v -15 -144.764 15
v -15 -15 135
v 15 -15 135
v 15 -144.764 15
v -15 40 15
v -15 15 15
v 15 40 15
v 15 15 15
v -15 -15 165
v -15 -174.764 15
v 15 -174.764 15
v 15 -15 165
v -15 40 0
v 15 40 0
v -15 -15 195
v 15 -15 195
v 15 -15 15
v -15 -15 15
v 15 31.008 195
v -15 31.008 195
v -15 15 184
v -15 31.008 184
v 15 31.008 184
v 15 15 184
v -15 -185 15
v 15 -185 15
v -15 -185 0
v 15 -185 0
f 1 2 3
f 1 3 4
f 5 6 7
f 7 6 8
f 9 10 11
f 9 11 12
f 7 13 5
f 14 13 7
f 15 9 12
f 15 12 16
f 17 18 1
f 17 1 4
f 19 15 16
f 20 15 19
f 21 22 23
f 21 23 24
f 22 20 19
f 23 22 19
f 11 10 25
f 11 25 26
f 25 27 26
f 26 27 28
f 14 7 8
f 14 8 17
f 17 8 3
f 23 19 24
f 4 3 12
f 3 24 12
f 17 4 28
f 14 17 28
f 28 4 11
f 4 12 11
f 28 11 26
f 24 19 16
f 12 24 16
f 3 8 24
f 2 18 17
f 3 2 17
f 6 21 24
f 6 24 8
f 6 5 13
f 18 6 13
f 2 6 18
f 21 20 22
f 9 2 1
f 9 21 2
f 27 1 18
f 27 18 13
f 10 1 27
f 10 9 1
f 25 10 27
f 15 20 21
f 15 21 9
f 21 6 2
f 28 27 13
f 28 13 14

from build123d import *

# Parameters (mm, degrees)
F0_W      = 30
F0_H      = 50
F1_DEPTH  = 15
F2_W      = 30
F2_H      = 30
F3_DEPTH  = 150
F4_DEPTH  = 160
F6_DEPTH  = 30
F7_W      = 16.00820072
F7_H      = 6
F8_DEPTH  = 30
F9_DEPTH  = 15
F10_DEPTH = 5


with BuildPart() as f1:
    # F0 (on Top) → F1 (new body)
    with BuildSketch(Plane.XY):
        Rectangle(F0_W, F0_H)
    extrude(amount=F1_DEPTH)

    # F2 (on face) → F3 (join)
    with BuildSketch(Plane.XY.offset(15)):
        Rectangle(F2_W, F2_H)
    extrude(amount=F3_DEPTH)

    # F4 (add): a face of the model
    f4_faces = [f1.faces().sort_by_distance(p)[0] for p in [
        (0, -25, 7.5),
    ]]
    extrude(f4_faces, amount=F4_DEPTH)

    # F5 (on face) → F6 (join)
    with BuildSketch(Plane(origin=(-15, 0, 0), x_dir=(0, -1, 0), z_dir=(-1, 0, 0))):
        Polygon((144.7644245625, 15), (174.7644245625, 15), (15, 165), (15, 135), align=None)
    extrude(amount=-F6_DEPTH)

    # F7 (on face) → F8 (join)
    with BuildSketch(Plane(origin=(-15, 0, 0), x_dir=(0, -1, 0), z_dir=(-1, 0, 0))):
        Polygon((-15, 189), (-15, 165), (15, 165), (15, 195), (-15, 195), align=None)
        with Locations((-23.00410036, 192)):
            Rectangle(F7_W, F7_H)
    extrude(amount=-F8_DEPTH)

    # F9 (add): a face of the model
    f9_faces = [f1.faces().sort_by_distance(p)[0] for p in [
        (0, 25, 7.5),
    ]]
    extrude(f9_faces, amount=F9_DEPTH)

    # F10 (add): a face of the model
    f10_faces = [f1.faces().sort_by_distance(p)[0] for p in [
        (0, 23.00410036, 189),
    ]]
    extrude(f10_faces, amount=F10_DEPTH)


solid = f1.part
